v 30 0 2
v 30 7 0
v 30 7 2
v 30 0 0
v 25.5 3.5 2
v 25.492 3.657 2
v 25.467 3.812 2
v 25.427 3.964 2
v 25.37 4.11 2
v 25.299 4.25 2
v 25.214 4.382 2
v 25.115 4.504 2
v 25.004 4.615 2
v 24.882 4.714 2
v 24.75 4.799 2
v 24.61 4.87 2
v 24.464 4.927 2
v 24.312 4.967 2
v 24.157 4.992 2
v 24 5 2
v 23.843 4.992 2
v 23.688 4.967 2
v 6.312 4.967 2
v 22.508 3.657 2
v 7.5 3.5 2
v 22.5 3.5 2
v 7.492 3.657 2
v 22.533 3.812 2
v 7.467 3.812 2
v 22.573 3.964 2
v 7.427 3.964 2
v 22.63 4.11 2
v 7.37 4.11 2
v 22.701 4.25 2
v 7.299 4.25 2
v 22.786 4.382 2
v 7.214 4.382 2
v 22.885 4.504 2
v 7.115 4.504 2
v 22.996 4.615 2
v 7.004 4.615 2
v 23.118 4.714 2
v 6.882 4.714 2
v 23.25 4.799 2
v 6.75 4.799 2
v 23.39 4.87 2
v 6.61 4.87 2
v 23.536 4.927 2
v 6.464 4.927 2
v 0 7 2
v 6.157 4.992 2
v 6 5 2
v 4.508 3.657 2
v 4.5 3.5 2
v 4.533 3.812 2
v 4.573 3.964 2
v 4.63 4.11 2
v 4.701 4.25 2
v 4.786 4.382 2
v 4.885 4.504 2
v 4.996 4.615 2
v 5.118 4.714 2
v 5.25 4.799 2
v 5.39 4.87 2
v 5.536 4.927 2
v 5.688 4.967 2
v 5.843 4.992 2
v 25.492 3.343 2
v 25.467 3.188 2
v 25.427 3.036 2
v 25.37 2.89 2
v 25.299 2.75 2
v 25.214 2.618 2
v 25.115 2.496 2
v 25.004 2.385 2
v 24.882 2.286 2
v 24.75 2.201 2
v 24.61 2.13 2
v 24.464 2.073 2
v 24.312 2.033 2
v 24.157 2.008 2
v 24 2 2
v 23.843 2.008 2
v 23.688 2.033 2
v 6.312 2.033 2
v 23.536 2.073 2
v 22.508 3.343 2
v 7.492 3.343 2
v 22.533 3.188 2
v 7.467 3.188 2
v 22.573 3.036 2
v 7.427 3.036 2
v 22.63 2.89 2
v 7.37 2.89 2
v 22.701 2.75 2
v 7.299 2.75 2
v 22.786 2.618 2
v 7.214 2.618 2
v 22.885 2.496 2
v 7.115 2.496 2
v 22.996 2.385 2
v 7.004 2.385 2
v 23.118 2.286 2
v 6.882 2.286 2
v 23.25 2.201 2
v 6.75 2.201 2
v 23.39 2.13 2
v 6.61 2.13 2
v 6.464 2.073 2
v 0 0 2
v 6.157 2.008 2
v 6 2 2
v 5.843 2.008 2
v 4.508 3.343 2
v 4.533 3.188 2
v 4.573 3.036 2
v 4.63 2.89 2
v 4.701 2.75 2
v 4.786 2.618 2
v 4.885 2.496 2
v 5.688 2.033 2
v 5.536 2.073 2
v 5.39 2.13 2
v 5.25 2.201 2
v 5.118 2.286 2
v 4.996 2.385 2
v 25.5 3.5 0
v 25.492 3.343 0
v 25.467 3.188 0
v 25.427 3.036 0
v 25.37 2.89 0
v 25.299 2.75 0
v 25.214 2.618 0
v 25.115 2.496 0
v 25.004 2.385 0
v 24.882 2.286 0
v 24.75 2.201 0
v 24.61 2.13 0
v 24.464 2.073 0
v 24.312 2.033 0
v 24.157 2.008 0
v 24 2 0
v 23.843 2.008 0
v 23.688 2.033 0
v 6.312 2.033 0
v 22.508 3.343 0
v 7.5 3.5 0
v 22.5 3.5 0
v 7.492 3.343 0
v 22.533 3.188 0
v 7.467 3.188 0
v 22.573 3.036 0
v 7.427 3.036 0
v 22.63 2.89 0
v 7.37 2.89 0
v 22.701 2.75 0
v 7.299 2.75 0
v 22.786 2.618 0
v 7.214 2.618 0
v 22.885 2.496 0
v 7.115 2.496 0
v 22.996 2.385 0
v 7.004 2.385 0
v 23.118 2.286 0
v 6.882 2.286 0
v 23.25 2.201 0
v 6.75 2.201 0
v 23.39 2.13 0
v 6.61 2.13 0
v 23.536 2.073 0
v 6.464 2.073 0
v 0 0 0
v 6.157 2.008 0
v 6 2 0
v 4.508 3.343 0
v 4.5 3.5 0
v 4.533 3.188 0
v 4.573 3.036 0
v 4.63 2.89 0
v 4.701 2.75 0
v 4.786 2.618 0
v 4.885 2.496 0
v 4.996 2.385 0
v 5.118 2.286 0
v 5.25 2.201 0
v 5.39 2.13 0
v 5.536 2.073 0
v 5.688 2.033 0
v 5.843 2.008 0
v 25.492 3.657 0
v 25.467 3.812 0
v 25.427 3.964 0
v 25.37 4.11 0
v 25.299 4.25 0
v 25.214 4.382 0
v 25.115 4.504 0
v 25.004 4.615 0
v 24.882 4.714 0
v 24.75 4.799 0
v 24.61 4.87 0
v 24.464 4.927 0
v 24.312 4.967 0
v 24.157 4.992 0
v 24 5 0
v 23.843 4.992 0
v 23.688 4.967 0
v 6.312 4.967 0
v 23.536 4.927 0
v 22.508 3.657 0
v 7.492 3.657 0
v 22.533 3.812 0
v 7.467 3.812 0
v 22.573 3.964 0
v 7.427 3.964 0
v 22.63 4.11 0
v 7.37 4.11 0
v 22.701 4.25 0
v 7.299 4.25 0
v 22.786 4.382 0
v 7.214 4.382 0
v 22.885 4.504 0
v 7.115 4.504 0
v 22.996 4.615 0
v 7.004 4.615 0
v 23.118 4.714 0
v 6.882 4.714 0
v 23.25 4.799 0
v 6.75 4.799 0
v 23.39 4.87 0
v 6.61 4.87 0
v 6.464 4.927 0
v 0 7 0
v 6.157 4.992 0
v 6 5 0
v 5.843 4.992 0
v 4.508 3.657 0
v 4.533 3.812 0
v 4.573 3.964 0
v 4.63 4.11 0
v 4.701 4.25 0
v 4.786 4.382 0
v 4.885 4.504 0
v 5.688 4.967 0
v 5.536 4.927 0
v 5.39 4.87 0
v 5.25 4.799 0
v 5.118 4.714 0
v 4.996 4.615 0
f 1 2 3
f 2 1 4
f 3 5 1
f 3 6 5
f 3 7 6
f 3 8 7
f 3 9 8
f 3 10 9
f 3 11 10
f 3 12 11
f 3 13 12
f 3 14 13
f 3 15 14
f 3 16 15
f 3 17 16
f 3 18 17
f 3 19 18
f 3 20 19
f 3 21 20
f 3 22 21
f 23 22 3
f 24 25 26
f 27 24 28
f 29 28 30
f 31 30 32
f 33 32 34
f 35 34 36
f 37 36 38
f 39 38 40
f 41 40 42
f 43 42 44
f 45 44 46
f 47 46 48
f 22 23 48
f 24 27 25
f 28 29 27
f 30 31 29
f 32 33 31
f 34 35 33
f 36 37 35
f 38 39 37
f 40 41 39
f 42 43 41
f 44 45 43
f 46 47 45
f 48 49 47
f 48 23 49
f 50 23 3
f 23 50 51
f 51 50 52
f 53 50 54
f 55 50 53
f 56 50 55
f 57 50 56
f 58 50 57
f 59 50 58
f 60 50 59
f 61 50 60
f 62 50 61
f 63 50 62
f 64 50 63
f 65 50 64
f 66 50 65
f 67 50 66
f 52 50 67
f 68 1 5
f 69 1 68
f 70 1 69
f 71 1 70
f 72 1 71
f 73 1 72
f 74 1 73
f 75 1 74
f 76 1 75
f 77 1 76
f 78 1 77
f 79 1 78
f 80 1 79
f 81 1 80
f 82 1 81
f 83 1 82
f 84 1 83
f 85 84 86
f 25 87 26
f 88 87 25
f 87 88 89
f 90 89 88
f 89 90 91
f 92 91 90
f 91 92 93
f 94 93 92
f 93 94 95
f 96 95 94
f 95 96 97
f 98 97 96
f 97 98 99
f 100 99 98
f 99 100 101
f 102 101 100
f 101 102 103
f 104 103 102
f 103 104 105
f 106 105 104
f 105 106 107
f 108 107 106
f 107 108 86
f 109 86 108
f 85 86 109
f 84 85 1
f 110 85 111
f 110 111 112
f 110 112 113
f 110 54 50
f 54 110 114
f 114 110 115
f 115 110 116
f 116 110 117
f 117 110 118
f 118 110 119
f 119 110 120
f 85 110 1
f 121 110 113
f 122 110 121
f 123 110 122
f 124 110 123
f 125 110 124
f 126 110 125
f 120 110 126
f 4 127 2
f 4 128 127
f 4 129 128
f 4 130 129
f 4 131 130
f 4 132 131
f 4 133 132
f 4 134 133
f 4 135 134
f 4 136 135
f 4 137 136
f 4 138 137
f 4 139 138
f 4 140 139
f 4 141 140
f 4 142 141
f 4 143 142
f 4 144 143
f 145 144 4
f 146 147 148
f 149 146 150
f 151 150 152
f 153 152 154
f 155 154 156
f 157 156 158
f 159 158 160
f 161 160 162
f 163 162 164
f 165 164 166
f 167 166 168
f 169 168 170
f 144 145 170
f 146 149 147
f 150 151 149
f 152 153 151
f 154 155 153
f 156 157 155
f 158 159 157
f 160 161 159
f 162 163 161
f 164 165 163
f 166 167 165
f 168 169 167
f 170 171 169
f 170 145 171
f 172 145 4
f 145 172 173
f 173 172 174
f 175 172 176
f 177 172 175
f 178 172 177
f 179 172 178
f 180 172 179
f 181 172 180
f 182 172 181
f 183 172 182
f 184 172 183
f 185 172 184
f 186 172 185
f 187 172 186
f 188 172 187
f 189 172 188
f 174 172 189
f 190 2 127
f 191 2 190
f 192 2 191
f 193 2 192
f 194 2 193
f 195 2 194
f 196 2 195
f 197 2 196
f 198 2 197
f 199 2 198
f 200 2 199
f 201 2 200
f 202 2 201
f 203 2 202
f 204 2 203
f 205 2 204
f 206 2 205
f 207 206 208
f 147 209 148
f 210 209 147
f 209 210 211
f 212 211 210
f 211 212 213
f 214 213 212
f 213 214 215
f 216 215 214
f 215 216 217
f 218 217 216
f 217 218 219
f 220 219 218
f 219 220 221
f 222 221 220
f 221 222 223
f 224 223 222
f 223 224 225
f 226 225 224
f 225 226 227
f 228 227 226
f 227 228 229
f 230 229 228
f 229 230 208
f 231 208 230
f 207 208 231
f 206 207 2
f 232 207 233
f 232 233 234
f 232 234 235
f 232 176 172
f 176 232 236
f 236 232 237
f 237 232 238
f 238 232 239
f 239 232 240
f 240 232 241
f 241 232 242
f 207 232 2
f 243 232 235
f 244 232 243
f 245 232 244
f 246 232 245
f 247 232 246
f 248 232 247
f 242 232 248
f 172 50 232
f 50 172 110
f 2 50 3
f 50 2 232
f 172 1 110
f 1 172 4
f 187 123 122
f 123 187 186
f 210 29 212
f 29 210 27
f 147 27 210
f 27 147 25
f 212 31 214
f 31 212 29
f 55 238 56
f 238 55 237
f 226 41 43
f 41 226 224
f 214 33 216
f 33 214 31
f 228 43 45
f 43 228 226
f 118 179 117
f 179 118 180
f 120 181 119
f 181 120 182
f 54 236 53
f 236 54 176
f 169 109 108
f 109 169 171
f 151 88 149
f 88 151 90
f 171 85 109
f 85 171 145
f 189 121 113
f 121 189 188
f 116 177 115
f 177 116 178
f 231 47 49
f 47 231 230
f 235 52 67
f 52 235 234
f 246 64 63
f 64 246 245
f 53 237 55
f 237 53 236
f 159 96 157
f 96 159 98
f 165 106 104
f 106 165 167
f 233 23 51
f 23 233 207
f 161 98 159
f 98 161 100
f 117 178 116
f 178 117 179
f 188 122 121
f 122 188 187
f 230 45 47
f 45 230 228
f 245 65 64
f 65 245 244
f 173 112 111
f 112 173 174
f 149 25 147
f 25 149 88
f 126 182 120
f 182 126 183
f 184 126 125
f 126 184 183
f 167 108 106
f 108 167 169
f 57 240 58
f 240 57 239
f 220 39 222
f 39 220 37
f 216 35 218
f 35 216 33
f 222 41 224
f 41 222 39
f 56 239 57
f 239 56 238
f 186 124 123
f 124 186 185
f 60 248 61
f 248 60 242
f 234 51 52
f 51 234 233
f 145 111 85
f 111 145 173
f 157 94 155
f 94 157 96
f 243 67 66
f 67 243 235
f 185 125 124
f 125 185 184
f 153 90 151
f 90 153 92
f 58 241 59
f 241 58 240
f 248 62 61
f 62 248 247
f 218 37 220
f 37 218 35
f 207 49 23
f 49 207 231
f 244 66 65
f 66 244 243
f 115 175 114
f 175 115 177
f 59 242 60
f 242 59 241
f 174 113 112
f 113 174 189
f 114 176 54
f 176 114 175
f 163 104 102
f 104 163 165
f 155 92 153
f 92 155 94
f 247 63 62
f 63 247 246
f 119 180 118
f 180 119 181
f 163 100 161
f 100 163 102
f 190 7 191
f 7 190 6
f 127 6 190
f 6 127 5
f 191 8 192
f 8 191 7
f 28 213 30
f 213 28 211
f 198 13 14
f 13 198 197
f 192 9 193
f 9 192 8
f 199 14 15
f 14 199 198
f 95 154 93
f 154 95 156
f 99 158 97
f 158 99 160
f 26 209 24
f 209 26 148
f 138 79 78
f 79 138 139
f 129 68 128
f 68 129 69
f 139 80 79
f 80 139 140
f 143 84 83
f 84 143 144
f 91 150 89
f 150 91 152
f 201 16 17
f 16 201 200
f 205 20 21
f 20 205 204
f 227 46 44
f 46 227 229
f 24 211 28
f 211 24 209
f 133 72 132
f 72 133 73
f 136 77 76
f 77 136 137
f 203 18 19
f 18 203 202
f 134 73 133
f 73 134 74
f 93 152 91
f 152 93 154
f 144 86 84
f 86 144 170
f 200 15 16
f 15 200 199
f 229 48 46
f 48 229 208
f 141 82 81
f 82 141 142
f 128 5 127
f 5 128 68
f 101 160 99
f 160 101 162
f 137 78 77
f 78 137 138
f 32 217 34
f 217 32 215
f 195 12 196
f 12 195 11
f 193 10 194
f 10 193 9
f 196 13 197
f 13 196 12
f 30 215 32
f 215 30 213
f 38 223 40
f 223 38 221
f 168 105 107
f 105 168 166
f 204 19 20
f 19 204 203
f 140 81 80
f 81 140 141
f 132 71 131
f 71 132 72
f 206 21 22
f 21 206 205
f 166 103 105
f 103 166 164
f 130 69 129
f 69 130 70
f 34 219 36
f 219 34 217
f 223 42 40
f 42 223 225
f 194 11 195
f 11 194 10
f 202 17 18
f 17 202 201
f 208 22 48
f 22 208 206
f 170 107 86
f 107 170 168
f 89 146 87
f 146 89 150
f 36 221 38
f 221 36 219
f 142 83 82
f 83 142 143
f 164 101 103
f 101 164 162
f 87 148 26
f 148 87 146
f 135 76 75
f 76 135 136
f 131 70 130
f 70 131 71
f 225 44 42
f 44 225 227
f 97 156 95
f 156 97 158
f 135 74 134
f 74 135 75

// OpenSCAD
$fn=60;

module cale() {
	difference() {
		cube( [30, 7, 2] );
		#translate( [(30-18)/2, 7/2, -1]) cylinder( r=3/2, h=10);
		#translate( [(30-18)/2+18, 7/2, -1]) cylinder( r=3/2, h=10);
	}
}

cale();
